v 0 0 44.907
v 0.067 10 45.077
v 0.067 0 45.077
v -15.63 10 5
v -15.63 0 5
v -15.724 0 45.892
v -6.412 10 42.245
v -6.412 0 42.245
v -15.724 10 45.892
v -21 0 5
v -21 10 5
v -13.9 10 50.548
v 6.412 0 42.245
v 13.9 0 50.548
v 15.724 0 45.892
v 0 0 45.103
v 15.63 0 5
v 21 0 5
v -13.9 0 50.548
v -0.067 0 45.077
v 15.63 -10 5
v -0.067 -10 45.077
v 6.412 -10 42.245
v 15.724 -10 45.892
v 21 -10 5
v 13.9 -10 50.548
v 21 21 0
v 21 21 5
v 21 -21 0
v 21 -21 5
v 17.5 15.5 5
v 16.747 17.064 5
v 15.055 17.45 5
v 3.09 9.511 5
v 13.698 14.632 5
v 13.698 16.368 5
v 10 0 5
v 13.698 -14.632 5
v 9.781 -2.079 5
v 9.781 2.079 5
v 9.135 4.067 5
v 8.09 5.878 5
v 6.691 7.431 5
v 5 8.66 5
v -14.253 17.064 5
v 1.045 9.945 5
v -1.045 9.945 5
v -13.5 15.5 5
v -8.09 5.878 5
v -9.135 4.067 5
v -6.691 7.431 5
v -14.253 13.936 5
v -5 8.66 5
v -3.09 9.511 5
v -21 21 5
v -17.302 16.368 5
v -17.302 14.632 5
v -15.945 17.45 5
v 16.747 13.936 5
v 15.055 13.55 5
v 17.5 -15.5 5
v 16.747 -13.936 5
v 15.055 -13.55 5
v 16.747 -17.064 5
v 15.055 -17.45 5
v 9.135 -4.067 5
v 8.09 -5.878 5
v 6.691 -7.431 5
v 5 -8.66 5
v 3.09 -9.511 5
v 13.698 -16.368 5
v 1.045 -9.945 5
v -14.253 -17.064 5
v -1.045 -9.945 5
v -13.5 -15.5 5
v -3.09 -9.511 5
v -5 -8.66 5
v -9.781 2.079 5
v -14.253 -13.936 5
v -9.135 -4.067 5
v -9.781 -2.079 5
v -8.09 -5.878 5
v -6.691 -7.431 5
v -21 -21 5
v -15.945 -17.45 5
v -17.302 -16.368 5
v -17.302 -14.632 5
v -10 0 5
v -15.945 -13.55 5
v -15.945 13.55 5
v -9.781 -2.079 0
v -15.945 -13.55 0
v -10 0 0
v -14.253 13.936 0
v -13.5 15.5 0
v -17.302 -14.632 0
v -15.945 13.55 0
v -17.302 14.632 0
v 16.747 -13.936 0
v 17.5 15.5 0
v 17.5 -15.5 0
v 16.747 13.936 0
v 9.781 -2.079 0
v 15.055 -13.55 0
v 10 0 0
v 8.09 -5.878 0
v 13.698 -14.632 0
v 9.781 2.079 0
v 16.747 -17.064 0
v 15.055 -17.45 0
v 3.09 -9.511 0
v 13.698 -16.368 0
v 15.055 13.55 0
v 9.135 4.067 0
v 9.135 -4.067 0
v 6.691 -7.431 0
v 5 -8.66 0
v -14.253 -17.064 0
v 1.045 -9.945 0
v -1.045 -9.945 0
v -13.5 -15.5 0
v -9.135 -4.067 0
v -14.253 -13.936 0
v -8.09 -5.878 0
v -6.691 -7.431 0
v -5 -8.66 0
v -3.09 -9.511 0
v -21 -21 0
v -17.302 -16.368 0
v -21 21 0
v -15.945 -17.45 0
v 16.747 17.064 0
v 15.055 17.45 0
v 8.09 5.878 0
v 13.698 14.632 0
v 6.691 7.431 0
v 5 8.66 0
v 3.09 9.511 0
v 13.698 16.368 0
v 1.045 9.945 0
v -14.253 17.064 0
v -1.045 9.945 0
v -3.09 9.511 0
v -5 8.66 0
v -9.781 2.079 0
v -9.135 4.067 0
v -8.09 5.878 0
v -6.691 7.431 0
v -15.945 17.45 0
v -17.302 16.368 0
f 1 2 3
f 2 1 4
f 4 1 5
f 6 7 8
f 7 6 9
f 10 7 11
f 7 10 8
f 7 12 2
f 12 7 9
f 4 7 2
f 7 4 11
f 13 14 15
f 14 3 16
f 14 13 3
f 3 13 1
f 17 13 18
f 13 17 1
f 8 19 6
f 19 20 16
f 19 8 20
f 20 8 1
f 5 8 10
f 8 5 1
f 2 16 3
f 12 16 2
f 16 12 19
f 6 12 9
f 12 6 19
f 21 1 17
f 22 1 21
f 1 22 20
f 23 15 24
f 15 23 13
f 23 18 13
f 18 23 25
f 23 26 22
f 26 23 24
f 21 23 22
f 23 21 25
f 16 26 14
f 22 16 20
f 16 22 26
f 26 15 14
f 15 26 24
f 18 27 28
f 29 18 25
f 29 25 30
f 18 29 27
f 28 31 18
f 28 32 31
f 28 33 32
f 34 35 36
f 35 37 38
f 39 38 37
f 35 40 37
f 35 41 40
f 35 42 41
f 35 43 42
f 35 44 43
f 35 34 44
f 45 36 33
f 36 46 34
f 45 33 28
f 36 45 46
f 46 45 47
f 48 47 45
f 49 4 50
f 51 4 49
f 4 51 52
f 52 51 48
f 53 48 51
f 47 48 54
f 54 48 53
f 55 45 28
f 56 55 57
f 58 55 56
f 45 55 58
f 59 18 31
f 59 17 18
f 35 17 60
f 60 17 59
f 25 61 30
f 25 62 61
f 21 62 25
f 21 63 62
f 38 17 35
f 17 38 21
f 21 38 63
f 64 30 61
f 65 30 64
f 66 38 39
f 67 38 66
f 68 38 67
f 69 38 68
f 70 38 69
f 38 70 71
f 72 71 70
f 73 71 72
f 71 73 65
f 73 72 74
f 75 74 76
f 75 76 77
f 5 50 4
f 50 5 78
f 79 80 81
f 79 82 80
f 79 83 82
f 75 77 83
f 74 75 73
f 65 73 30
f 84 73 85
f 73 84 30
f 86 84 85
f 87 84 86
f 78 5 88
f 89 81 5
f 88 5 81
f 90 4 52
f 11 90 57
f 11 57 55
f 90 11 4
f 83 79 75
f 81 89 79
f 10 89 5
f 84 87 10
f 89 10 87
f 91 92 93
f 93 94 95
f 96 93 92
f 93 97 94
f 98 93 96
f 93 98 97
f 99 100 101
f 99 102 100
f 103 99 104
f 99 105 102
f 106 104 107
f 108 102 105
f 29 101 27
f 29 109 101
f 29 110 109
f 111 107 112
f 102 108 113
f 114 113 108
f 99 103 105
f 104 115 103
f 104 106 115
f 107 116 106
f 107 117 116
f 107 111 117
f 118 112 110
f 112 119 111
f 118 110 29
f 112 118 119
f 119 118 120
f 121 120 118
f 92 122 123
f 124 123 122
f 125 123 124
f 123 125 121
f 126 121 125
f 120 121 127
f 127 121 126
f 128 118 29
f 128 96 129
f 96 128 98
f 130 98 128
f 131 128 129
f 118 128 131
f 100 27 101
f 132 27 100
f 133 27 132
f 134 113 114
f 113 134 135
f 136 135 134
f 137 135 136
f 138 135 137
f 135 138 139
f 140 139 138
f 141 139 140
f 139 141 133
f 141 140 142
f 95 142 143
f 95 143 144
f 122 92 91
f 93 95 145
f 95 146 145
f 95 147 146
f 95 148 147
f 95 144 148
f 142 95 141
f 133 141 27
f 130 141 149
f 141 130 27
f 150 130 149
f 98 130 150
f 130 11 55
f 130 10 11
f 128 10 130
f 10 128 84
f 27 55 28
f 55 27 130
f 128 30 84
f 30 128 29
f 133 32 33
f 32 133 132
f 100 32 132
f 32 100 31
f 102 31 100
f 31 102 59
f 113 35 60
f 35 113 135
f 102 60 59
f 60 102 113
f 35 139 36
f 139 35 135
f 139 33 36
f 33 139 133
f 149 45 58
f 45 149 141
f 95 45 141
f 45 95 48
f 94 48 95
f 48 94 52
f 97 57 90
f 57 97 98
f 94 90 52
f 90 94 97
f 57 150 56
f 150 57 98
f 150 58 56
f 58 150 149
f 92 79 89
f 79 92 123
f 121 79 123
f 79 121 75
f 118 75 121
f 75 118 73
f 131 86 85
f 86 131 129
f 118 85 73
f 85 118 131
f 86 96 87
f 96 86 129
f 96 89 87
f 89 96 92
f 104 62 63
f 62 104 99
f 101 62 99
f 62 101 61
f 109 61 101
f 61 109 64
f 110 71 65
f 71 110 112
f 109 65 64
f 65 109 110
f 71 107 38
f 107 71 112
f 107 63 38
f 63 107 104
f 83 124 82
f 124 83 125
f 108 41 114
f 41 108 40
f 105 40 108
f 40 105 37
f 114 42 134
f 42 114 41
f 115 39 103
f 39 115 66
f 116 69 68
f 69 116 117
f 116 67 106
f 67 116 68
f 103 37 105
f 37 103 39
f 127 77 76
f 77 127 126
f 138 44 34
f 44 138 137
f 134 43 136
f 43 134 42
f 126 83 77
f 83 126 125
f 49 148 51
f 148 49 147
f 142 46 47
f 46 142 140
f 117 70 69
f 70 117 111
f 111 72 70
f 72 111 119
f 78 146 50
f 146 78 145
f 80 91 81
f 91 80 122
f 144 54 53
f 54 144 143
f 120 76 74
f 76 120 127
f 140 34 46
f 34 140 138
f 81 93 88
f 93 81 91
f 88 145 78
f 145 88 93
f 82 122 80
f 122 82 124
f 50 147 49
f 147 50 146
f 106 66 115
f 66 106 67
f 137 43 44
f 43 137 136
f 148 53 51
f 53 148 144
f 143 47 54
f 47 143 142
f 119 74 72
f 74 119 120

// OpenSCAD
module hangingMount(){
	motorWidth = 42;
	height = 25;
	bolt = 4;
	boltOffset = 15.5;
	wallThickness = 5;
	supportThickness = 5;
	supportWidth = 10;
	supportHeight = 40;
	centerCutout = 20;
	railInnerWidth = 15;
	distToRail=60;
	railOuterWidth = 18; //Replace these with real caliper values
	underslungHeight = 20;
	frameWidth = motorWidth;

	supportXOffset = frameWidth/2;
	supportYOffset = -supportWidth/2;

	distToSupportOuter = supportXOffset+supportThickness/2;
	supportAngle = atan(distToRail/distToSupportOuter);
	
	difference(){
		//Stuff to be added to the shape
		union(){
			translate([-frameWidth/2, -frameWidth/2, 0]){
				cube([motorWidth, motorWidth, wallThickness]);
			}
			
			translate([-supportXOffset, 0, wallThickness]){
				rotate([0, 90-supportAngle, 0]){
					cube([supportThickness, supportWidth, supportHeight]);
					translate([-10,0,supportHeight]){
						cube([15,10,5]);
					}
				}
			}
			
			translate([supportXOffset, 0, wallThickness]){
				rotate([0, 90-supportAngle, 180]){
					cube([supportThickness, supportWidth, supportHeight]);
					translate([-10,0,supportHeight]){
						cube([15,10,5]);
					}
				}
			}
		}
		//Stuff to be carved out of the added shape
		union(){
			translate([boltOffset, boltOffset, -1]){
				cylinder(r=bolt/2, h=wallThickness+2);
			}
			translate([-boltOffset, boltOffset, -1]){
				cylinder(r=bolt/2, h=wallThickness+2);
			}
			translate([-boltOffset, -boltOffset, -1]){
				cylinder(r=bolt/2, h=wallThickness+2);
			}
			translate([boltOffset, -boltOffset, -1]){
				cylinder(r=bolt/2, h=wallThickness+2);
			}
		
			//Center hole/shaft cutout
			translate([0,0, -1]){
				cylinder(r=centerCutout/2, h=wallThickness+2);
			}
		}
	}
	
}

hangingMount();
